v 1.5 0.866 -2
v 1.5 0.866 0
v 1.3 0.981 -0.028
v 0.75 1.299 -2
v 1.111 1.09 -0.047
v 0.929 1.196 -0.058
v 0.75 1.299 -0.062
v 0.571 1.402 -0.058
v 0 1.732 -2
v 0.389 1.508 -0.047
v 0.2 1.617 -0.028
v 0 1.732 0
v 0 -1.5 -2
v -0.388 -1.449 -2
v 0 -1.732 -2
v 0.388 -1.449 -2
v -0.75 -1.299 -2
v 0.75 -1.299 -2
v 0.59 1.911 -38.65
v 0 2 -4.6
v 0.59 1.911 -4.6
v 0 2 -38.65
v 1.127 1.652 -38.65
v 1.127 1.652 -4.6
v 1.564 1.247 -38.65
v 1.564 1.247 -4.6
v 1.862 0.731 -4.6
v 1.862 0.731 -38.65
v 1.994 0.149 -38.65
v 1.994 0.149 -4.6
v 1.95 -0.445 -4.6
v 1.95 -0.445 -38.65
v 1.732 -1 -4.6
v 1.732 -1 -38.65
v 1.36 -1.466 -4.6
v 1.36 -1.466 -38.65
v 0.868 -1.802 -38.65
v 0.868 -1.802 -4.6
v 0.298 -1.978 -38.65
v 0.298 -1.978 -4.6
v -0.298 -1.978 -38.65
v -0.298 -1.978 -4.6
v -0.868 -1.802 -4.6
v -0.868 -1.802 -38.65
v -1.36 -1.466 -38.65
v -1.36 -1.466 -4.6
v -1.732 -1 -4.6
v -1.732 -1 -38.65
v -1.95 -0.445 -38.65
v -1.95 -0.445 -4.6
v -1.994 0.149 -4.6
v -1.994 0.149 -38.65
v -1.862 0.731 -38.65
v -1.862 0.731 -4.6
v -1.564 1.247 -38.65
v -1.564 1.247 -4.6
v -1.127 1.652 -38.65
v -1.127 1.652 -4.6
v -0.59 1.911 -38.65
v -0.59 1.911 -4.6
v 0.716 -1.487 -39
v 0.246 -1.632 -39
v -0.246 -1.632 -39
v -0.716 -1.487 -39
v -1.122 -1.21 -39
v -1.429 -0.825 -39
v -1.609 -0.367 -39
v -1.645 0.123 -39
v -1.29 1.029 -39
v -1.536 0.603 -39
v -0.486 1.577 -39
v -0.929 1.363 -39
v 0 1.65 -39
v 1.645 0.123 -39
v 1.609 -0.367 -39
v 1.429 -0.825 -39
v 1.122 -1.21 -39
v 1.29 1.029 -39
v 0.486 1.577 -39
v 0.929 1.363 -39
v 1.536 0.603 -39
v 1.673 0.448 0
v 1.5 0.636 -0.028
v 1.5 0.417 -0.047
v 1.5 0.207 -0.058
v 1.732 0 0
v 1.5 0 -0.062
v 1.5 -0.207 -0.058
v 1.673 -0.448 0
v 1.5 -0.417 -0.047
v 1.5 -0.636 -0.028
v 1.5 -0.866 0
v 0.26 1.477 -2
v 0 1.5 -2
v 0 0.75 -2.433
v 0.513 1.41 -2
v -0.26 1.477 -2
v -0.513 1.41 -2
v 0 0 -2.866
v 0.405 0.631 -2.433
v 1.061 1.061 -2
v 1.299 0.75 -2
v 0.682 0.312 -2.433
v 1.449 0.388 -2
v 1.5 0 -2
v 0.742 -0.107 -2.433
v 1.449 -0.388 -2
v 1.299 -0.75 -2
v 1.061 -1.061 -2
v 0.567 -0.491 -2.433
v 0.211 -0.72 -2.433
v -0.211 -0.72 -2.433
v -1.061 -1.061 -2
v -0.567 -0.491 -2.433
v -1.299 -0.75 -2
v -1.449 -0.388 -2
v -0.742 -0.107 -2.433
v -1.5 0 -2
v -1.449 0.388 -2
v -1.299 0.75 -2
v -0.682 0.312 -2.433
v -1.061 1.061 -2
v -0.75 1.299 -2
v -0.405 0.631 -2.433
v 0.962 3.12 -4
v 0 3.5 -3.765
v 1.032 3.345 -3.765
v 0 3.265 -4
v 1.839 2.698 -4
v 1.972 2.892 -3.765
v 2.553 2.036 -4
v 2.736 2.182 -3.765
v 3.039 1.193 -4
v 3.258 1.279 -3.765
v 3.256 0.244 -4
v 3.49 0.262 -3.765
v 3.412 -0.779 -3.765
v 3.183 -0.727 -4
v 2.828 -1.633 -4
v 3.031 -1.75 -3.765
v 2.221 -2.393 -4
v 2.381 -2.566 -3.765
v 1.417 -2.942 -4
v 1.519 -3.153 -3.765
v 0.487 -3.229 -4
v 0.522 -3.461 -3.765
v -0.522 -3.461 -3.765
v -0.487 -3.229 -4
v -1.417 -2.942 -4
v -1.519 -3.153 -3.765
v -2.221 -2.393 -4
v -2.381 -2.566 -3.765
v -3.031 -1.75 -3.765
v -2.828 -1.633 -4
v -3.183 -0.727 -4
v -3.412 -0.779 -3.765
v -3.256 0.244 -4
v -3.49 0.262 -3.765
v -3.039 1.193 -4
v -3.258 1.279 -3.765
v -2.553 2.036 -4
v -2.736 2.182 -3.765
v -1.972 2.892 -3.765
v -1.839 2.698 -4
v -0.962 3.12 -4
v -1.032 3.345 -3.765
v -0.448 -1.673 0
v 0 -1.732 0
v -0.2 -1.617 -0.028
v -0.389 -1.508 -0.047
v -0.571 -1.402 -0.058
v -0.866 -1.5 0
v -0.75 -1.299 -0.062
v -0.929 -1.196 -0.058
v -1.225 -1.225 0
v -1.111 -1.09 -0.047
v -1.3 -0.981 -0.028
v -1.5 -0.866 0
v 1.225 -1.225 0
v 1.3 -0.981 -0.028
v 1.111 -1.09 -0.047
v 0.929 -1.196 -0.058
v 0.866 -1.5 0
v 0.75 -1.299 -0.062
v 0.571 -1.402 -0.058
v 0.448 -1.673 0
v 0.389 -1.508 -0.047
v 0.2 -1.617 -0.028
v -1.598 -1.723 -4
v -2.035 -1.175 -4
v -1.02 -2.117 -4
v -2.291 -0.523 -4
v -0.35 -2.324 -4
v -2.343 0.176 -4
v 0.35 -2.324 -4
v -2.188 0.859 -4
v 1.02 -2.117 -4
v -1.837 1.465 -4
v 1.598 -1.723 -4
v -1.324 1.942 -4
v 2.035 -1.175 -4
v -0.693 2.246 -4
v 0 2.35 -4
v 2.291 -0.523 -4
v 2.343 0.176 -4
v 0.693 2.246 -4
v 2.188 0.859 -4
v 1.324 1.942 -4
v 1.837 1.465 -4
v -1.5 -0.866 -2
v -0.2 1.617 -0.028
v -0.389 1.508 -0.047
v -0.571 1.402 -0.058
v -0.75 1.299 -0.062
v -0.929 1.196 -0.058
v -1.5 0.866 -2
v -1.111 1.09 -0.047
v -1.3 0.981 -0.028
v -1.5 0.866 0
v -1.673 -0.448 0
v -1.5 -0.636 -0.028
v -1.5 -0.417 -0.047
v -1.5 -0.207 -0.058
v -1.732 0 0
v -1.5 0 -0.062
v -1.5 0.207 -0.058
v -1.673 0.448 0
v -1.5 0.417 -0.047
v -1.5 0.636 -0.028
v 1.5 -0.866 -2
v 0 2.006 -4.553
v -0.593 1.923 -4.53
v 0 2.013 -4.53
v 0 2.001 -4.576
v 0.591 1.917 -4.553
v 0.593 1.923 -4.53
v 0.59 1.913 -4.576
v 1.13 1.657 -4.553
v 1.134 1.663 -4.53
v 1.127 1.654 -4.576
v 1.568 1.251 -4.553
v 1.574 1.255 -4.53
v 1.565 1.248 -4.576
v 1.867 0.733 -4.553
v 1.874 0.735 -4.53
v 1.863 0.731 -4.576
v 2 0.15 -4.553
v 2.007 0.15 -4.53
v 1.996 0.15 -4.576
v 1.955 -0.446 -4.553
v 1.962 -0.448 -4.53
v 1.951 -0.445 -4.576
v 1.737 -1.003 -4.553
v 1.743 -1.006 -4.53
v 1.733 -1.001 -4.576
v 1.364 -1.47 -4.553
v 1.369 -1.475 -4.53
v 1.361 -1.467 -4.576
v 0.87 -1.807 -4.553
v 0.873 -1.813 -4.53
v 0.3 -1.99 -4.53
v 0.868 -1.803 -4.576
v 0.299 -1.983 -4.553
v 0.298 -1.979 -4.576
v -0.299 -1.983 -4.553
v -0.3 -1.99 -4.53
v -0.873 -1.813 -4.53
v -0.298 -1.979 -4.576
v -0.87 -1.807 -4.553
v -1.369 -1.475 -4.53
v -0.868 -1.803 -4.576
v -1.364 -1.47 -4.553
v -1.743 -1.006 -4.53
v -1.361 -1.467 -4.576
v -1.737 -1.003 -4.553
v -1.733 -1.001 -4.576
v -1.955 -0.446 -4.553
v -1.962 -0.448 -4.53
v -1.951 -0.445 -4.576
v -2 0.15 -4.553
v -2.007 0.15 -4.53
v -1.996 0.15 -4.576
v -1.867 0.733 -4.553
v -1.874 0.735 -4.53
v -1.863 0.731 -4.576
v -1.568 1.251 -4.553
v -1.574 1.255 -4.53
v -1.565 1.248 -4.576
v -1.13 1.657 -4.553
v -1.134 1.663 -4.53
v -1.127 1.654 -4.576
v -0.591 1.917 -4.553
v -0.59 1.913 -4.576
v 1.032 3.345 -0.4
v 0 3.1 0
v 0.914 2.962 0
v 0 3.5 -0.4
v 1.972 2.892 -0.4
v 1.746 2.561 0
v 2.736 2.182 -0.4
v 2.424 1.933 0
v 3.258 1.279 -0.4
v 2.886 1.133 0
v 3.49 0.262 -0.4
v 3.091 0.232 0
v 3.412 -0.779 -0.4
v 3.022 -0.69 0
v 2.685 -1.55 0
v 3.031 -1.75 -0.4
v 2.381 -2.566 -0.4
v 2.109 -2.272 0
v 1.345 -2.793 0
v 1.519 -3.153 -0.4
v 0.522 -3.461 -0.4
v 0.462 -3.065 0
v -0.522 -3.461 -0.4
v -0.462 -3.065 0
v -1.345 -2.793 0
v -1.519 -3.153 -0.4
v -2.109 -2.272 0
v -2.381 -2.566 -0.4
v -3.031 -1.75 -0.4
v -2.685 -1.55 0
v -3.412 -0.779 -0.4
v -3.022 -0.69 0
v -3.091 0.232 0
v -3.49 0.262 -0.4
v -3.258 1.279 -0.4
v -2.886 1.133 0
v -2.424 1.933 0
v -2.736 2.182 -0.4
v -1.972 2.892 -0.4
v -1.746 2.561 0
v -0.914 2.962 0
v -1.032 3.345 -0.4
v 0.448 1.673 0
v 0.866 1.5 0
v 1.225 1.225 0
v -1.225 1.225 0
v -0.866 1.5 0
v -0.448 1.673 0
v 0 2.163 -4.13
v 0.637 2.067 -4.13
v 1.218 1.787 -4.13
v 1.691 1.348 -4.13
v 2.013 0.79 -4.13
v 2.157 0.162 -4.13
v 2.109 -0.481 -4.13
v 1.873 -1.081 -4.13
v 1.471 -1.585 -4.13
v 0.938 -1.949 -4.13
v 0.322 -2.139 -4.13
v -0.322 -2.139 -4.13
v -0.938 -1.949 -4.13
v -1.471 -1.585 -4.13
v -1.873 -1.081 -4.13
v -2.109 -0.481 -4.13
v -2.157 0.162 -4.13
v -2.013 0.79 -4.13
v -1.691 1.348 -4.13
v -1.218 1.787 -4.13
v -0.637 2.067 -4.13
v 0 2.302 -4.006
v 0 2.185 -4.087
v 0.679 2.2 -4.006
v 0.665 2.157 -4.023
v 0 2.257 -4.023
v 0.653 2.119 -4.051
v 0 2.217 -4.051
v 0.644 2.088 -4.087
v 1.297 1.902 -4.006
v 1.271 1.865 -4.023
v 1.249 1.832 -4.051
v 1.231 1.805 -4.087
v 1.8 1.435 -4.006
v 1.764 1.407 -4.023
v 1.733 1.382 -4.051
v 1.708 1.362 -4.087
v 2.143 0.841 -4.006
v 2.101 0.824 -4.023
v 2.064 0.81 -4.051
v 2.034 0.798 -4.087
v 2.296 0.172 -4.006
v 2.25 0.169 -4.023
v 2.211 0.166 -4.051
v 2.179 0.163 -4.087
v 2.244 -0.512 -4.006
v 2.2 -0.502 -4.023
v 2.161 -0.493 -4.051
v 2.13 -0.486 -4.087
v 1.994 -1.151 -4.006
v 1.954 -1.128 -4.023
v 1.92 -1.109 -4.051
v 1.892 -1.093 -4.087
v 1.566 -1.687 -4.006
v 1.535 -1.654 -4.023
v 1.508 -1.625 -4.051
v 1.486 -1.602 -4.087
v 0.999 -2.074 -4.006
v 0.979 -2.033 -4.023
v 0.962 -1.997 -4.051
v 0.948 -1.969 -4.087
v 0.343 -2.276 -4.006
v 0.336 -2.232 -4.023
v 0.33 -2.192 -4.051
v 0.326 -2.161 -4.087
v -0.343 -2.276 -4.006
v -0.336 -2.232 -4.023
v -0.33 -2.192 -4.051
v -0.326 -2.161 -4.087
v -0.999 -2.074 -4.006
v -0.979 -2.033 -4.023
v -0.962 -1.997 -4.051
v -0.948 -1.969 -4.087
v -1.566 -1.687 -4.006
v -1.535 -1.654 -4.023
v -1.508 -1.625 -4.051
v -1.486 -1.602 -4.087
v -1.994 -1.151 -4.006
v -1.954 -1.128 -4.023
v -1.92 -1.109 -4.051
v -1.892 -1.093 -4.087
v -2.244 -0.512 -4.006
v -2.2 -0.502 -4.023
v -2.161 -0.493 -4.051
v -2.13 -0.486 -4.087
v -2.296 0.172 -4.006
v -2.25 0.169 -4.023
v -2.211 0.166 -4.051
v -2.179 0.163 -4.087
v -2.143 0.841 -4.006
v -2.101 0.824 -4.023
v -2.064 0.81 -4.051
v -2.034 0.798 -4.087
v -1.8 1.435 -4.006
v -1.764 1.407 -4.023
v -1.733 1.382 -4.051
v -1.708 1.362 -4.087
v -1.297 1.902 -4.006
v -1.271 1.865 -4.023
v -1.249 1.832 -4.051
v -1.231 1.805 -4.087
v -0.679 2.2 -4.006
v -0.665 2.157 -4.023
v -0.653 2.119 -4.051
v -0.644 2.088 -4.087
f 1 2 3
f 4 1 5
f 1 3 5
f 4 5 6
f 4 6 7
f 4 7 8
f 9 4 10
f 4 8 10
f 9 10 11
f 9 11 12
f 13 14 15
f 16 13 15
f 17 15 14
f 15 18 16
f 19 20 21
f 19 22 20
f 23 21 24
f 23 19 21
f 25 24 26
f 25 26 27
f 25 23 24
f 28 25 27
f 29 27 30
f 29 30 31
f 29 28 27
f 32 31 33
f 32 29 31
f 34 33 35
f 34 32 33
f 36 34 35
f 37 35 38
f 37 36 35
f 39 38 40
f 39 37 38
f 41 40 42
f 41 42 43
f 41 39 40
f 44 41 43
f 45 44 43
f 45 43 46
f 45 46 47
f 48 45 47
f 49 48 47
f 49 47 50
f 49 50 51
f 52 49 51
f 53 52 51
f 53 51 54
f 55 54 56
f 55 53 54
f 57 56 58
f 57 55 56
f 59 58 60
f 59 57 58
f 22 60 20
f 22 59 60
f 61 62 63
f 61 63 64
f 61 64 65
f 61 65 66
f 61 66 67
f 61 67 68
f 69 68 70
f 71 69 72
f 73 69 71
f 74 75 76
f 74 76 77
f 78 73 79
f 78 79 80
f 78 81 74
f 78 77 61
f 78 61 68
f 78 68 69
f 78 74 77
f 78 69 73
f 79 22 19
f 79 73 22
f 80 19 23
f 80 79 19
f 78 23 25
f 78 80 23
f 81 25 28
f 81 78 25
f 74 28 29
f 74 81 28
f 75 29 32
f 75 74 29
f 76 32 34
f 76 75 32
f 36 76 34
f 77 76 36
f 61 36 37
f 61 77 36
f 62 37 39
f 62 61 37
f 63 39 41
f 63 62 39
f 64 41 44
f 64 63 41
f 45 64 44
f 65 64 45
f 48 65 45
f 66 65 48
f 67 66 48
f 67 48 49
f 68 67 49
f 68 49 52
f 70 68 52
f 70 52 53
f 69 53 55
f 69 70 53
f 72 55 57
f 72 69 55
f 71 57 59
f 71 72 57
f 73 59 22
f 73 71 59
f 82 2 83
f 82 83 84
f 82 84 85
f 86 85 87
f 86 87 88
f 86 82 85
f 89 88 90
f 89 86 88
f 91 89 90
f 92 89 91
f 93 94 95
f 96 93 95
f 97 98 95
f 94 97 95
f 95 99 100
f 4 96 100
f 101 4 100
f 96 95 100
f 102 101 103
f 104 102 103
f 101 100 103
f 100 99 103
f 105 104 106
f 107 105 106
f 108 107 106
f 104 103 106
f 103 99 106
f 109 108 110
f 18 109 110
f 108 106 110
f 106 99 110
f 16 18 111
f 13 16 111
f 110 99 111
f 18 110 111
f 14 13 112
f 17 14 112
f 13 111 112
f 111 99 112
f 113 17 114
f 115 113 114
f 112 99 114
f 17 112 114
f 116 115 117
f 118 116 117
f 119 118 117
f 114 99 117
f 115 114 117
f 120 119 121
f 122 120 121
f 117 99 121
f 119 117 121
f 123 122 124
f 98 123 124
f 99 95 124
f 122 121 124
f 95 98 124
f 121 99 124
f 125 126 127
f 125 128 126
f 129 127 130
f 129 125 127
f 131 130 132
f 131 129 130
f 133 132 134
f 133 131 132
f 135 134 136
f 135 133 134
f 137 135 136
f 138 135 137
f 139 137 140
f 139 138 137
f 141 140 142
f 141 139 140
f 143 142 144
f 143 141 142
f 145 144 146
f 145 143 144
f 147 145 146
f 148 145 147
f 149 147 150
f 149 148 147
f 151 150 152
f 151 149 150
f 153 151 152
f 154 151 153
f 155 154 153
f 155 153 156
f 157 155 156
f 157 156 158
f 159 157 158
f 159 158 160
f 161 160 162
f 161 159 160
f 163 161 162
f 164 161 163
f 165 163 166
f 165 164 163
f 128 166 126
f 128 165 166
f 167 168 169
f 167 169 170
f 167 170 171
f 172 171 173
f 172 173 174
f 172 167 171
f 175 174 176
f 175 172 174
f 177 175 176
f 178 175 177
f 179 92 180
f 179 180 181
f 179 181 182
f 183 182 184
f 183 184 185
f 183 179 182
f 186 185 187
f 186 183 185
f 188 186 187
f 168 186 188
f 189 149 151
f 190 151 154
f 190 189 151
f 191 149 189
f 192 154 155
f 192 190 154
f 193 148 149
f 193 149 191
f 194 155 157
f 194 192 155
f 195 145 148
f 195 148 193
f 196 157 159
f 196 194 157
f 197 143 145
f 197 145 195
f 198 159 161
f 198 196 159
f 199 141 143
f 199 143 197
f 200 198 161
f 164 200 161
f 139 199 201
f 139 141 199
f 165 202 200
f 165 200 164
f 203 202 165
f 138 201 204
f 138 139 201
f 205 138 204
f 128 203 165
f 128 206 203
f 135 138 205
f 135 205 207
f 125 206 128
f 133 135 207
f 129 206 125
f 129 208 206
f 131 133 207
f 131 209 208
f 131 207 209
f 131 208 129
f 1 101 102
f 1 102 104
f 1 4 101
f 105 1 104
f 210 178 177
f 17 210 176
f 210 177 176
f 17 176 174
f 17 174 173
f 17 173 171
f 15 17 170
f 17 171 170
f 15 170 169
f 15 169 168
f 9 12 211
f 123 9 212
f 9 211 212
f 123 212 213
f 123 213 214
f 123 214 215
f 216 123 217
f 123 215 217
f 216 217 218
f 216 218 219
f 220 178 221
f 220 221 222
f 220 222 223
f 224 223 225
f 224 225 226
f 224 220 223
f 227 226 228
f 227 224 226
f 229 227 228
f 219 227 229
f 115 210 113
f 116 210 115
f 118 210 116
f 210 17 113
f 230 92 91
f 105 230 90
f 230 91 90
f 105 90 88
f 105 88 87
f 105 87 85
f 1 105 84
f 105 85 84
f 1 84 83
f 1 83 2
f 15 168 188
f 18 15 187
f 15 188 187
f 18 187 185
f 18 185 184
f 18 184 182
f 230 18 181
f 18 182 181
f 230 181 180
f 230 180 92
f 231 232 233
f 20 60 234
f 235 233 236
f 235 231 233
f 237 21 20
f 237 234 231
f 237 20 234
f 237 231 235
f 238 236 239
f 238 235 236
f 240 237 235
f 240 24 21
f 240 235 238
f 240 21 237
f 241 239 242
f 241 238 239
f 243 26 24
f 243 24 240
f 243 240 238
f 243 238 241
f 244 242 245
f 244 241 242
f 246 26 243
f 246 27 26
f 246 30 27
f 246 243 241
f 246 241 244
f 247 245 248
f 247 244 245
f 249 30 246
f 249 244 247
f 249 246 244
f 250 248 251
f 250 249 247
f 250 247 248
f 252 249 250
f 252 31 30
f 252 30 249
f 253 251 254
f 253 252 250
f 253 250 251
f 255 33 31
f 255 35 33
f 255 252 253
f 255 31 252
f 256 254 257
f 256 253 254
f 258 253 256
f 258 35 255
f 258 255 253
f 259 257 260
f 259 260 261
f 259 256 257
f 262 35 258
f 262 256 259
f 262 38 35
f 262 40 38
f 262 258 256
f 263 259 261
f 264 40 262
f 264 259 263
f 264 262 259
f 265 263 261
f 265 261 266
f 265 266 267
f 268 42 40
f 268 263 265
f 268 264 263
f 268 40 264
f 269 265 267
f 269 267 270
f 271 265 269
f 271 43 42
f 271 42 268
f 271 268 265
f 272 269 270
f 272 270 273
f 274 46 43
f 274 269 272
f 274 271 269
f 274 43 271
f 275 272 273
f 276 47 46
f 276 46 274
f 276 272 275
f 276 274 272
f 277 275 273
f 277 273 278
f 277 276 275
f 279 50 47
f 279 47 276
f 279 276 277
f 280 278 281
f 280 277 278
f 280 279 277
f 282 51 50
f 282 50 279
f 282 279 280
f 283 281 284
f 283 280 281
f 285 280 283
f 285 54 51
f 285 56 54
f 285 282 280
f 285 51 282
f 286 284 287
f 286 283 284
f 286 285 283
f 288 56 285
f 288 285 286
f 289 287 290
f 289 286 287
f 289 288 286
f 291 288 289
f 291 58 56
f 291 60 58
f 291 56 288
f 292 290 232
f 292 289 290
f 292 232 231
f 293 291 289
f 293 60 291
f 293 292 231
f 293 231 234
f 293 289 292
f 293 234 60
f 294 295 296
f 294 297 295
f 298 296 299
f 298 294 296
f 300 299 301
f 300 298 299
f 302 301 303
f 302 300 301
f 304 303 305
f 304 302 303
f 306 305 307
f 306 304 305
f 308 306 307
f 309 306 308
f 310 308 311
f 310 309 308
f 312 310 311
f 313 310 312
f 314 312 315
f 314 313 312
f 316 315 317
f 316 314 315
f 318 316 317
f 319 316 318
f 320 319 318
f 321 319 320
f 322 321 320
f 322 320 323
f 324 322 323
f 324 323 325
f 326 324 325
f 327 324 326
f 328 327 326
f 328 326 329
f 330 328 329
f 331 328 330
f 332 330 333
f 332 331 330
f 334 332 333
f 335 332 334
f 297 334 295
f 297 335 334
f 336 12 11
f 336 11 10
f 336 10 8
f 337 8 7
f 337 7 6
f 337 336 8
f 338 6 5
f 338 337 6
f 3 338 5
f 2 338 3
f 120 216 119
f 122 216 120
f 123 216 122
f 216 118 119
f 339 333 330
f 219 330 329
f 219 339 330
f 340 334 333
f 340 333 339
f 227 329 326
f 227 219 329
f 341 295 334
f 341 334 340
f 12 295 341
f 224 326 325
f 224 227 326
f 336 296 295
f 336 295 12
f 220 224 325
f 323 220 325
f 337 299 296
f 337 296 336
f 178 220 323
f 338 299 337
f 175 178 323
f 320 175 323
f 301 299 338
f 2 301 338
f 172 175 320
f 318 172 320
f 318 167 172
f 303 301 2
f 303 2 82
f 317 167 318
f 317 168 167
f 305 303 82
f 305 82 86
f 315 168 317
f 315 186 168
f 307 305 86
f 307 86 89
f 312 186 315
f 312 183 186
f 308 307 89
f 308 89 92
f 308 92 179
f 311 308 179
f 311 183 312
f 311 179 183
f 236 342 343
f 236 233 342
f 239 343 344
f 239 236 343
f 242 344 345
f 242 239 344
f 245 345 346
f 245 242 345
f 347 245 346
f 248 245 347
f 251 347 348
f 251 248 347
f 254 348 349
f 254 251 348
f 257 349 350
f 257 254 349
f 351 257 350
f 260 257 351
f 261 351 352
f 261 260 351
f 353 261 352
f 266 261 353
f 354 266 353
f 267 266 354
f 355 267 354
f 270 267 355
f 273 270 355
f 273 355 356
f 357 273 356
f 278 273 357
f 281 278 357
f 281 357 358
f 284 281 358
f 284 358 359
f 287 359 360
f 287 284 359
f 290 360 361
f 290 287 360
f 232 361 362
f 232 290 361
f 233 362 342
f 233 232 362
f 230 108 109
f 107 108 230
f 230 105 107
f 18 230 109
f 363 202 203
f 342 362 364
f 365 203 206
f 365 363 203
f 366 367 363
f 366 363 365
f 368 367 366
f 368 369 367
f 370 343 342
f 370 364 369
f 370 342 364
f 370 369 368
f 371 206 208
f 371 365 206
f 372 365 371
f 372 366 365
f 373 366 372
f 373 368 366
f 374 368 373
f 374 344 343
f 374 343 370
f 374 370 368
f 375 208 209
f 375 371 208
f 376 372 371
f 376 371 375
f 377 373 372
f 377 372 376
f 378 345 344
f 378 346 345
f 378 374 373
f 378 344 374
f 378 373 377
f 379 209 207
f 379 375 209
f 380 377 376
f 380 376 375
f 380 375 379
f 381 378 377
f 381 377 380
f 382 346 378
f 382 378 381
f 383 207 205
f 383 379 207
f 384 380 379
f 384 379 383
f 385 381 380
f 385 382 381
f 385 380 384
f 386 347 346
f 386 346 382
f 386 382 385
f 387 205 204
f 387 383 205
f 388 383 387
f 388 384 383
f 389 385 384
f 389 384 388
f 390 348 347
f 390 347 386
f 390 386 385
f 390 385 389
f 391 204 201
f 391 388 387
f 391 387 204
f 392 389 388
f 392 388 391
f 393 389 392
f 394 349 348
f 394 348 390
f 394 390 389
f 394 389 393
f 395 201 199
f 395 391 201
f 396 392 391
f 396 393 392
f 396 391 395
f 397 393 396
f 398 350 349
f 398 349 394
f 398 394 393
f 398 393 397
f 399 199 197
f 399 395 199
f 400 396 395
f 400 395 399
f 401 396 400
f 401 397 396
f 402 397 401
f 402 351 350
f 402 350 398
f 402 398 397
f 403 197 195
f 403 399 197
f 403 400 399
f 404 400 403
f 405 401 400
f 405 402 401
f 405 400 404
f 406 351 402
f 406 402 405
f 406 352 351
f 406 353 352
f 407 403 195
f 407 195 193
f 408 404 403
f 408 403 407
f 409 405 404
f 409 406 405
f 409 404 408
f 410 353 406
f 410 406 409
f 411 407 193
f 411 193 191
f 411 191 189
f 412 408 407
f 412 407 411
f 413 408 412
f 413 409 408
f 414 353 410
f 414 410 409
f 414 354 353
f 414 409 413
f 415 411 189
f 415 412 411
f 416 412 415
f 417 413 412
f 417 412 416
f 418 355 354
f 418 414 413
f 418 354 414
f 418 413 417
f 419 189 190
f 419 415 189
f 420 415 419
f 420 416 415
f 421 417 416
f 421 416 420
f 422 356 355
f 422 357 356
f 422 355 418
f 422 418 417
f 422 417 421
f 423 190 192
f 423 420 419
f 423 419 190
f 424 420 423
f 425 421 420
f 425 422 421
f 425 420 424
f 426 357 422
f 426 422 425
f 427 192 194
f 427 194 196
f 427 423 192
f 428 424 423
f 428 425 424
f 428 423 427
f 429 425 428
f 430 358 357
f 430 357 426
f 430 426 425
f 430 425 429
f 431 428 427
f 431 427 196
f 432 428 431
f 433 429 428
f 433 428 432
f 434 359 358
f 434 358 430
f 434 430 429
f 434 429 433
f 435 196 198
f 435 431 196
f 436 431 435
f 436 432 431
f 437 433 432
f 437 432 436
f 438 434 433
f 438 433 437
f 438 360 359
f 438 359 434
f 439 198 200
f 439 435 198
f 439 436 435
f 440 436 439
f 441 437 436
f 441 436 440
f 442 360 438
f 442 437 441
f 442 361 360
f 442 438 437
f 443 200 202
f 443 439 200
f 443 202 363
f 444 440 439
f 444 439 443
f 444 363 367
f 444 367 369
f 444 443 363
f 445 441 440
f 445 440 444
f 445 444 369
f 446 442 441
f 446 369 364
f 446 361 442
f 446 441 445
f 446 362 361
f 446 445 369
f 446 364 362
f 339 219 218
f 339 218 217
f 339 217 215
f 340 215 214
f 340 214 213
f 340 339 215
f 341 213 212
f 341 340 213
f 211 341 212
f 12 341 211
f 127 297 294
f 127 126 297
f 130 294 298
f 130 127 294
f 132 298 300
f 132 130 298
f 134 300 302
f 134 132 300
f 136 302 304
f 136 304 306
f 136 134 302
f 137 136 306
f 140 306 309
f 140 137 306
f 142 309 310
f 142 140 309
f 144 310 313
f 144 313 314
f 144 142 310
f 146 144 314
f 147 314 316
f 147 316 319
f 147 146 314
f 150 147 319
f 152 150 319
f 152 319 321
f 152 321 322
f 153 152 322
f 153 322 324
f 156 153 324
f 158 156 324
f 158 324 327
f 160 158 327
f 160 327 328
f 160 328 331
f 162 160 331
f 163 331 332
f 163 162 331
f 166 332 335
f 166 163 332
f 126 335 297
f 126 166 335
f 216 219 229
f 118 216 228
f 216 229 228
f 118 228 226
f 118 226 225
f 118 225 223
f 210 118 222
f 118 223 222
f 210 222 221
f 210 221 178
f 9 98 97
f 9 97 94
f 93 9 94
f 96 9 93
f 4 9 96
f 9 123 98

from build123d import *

# Parameters (mm, degrees)
CUT_EXTRUDE1_DEPTH = 2


with BuildPart() as part:
    # Sketch1 → Revolve1 (revolve)
    with BuildSketch(Plane(origin=(0, 0, 0), x_dir=(0, 0, -1), z_dir=(1, 0, 0))):
        with BuildLine():
            Line((0, 0), (0, 3.1))
            Line((0, 3.1), (0.4, 3.5))
            Line((0.4, 3.5), (3.765, 3.5))
            Line((3.765, 3.5), (4, 3.265))
            Line((4, 3.265), (4, 2.35))
            ThreePointArc((4, 2.35), (4.035614876, 2.236081032), (4.129775312, 2.162734164))
            Line((4.129775312, 2.162734164), (4.529775312, 2.012734164))
            ThreePointArc((4.529775312, 2.012734164), (4.564315039, 2.00320929), (4.6, 2))
            Line((4.6, 2), (38.65, 2))
            Line((38.65, 2), (39, 1.65))
            Line((39, 1.65), (39, 0))
            Line((39, 0), (0, 0))
        make_face()
    revolve(axis=Axis((0, 0, 0), (0, 0, -1)))

    # Sketch2 → Cut-Extrude1 (cut)
    with BuildSketch(Plane.XY):
        Polygon((0, 1.732050808), (-1.5, 0.866025404), (-1.5, -0.866025404), (0, -1.732050808), (1.5, -0.866025404), (1.5, 0.866025404), align=None)
    extrude(amount=-CUT_EXTRUDE1_DEPTH, mode=Mode.SUBTRACT)

    # Sketch3 → Cut-Revolve2 (revolve, cut)
    with BuildSketch(Plane(origin=(0, 0, 0), x_dir=(0, 0, -1), z_dir=(1, 0, 0))):
        Polygon((2, 0), (2, 1.5), (2.866025404, 0), align=None)
    revolve(axis=Axis((0, 0, -2), (0, 0, -1)), mode=Mode.SUBTRACT)

    # Sketch4 → Cut-Revolve3 (revolve, cut)
    with BuildSketch(Plane(origin=(0, 0, 0), x_dir=(0, 0, -1), z_dir=(1, 0, 0))):
        Polygon((0, 1.732050808), (0, 1.5), (0.062177826, 1.5), align=None)
    revolve(axis=Axis((0, 0, 0), (0, 0, -1)), mode=Mode.SUBTRACT)


solid = part.part
